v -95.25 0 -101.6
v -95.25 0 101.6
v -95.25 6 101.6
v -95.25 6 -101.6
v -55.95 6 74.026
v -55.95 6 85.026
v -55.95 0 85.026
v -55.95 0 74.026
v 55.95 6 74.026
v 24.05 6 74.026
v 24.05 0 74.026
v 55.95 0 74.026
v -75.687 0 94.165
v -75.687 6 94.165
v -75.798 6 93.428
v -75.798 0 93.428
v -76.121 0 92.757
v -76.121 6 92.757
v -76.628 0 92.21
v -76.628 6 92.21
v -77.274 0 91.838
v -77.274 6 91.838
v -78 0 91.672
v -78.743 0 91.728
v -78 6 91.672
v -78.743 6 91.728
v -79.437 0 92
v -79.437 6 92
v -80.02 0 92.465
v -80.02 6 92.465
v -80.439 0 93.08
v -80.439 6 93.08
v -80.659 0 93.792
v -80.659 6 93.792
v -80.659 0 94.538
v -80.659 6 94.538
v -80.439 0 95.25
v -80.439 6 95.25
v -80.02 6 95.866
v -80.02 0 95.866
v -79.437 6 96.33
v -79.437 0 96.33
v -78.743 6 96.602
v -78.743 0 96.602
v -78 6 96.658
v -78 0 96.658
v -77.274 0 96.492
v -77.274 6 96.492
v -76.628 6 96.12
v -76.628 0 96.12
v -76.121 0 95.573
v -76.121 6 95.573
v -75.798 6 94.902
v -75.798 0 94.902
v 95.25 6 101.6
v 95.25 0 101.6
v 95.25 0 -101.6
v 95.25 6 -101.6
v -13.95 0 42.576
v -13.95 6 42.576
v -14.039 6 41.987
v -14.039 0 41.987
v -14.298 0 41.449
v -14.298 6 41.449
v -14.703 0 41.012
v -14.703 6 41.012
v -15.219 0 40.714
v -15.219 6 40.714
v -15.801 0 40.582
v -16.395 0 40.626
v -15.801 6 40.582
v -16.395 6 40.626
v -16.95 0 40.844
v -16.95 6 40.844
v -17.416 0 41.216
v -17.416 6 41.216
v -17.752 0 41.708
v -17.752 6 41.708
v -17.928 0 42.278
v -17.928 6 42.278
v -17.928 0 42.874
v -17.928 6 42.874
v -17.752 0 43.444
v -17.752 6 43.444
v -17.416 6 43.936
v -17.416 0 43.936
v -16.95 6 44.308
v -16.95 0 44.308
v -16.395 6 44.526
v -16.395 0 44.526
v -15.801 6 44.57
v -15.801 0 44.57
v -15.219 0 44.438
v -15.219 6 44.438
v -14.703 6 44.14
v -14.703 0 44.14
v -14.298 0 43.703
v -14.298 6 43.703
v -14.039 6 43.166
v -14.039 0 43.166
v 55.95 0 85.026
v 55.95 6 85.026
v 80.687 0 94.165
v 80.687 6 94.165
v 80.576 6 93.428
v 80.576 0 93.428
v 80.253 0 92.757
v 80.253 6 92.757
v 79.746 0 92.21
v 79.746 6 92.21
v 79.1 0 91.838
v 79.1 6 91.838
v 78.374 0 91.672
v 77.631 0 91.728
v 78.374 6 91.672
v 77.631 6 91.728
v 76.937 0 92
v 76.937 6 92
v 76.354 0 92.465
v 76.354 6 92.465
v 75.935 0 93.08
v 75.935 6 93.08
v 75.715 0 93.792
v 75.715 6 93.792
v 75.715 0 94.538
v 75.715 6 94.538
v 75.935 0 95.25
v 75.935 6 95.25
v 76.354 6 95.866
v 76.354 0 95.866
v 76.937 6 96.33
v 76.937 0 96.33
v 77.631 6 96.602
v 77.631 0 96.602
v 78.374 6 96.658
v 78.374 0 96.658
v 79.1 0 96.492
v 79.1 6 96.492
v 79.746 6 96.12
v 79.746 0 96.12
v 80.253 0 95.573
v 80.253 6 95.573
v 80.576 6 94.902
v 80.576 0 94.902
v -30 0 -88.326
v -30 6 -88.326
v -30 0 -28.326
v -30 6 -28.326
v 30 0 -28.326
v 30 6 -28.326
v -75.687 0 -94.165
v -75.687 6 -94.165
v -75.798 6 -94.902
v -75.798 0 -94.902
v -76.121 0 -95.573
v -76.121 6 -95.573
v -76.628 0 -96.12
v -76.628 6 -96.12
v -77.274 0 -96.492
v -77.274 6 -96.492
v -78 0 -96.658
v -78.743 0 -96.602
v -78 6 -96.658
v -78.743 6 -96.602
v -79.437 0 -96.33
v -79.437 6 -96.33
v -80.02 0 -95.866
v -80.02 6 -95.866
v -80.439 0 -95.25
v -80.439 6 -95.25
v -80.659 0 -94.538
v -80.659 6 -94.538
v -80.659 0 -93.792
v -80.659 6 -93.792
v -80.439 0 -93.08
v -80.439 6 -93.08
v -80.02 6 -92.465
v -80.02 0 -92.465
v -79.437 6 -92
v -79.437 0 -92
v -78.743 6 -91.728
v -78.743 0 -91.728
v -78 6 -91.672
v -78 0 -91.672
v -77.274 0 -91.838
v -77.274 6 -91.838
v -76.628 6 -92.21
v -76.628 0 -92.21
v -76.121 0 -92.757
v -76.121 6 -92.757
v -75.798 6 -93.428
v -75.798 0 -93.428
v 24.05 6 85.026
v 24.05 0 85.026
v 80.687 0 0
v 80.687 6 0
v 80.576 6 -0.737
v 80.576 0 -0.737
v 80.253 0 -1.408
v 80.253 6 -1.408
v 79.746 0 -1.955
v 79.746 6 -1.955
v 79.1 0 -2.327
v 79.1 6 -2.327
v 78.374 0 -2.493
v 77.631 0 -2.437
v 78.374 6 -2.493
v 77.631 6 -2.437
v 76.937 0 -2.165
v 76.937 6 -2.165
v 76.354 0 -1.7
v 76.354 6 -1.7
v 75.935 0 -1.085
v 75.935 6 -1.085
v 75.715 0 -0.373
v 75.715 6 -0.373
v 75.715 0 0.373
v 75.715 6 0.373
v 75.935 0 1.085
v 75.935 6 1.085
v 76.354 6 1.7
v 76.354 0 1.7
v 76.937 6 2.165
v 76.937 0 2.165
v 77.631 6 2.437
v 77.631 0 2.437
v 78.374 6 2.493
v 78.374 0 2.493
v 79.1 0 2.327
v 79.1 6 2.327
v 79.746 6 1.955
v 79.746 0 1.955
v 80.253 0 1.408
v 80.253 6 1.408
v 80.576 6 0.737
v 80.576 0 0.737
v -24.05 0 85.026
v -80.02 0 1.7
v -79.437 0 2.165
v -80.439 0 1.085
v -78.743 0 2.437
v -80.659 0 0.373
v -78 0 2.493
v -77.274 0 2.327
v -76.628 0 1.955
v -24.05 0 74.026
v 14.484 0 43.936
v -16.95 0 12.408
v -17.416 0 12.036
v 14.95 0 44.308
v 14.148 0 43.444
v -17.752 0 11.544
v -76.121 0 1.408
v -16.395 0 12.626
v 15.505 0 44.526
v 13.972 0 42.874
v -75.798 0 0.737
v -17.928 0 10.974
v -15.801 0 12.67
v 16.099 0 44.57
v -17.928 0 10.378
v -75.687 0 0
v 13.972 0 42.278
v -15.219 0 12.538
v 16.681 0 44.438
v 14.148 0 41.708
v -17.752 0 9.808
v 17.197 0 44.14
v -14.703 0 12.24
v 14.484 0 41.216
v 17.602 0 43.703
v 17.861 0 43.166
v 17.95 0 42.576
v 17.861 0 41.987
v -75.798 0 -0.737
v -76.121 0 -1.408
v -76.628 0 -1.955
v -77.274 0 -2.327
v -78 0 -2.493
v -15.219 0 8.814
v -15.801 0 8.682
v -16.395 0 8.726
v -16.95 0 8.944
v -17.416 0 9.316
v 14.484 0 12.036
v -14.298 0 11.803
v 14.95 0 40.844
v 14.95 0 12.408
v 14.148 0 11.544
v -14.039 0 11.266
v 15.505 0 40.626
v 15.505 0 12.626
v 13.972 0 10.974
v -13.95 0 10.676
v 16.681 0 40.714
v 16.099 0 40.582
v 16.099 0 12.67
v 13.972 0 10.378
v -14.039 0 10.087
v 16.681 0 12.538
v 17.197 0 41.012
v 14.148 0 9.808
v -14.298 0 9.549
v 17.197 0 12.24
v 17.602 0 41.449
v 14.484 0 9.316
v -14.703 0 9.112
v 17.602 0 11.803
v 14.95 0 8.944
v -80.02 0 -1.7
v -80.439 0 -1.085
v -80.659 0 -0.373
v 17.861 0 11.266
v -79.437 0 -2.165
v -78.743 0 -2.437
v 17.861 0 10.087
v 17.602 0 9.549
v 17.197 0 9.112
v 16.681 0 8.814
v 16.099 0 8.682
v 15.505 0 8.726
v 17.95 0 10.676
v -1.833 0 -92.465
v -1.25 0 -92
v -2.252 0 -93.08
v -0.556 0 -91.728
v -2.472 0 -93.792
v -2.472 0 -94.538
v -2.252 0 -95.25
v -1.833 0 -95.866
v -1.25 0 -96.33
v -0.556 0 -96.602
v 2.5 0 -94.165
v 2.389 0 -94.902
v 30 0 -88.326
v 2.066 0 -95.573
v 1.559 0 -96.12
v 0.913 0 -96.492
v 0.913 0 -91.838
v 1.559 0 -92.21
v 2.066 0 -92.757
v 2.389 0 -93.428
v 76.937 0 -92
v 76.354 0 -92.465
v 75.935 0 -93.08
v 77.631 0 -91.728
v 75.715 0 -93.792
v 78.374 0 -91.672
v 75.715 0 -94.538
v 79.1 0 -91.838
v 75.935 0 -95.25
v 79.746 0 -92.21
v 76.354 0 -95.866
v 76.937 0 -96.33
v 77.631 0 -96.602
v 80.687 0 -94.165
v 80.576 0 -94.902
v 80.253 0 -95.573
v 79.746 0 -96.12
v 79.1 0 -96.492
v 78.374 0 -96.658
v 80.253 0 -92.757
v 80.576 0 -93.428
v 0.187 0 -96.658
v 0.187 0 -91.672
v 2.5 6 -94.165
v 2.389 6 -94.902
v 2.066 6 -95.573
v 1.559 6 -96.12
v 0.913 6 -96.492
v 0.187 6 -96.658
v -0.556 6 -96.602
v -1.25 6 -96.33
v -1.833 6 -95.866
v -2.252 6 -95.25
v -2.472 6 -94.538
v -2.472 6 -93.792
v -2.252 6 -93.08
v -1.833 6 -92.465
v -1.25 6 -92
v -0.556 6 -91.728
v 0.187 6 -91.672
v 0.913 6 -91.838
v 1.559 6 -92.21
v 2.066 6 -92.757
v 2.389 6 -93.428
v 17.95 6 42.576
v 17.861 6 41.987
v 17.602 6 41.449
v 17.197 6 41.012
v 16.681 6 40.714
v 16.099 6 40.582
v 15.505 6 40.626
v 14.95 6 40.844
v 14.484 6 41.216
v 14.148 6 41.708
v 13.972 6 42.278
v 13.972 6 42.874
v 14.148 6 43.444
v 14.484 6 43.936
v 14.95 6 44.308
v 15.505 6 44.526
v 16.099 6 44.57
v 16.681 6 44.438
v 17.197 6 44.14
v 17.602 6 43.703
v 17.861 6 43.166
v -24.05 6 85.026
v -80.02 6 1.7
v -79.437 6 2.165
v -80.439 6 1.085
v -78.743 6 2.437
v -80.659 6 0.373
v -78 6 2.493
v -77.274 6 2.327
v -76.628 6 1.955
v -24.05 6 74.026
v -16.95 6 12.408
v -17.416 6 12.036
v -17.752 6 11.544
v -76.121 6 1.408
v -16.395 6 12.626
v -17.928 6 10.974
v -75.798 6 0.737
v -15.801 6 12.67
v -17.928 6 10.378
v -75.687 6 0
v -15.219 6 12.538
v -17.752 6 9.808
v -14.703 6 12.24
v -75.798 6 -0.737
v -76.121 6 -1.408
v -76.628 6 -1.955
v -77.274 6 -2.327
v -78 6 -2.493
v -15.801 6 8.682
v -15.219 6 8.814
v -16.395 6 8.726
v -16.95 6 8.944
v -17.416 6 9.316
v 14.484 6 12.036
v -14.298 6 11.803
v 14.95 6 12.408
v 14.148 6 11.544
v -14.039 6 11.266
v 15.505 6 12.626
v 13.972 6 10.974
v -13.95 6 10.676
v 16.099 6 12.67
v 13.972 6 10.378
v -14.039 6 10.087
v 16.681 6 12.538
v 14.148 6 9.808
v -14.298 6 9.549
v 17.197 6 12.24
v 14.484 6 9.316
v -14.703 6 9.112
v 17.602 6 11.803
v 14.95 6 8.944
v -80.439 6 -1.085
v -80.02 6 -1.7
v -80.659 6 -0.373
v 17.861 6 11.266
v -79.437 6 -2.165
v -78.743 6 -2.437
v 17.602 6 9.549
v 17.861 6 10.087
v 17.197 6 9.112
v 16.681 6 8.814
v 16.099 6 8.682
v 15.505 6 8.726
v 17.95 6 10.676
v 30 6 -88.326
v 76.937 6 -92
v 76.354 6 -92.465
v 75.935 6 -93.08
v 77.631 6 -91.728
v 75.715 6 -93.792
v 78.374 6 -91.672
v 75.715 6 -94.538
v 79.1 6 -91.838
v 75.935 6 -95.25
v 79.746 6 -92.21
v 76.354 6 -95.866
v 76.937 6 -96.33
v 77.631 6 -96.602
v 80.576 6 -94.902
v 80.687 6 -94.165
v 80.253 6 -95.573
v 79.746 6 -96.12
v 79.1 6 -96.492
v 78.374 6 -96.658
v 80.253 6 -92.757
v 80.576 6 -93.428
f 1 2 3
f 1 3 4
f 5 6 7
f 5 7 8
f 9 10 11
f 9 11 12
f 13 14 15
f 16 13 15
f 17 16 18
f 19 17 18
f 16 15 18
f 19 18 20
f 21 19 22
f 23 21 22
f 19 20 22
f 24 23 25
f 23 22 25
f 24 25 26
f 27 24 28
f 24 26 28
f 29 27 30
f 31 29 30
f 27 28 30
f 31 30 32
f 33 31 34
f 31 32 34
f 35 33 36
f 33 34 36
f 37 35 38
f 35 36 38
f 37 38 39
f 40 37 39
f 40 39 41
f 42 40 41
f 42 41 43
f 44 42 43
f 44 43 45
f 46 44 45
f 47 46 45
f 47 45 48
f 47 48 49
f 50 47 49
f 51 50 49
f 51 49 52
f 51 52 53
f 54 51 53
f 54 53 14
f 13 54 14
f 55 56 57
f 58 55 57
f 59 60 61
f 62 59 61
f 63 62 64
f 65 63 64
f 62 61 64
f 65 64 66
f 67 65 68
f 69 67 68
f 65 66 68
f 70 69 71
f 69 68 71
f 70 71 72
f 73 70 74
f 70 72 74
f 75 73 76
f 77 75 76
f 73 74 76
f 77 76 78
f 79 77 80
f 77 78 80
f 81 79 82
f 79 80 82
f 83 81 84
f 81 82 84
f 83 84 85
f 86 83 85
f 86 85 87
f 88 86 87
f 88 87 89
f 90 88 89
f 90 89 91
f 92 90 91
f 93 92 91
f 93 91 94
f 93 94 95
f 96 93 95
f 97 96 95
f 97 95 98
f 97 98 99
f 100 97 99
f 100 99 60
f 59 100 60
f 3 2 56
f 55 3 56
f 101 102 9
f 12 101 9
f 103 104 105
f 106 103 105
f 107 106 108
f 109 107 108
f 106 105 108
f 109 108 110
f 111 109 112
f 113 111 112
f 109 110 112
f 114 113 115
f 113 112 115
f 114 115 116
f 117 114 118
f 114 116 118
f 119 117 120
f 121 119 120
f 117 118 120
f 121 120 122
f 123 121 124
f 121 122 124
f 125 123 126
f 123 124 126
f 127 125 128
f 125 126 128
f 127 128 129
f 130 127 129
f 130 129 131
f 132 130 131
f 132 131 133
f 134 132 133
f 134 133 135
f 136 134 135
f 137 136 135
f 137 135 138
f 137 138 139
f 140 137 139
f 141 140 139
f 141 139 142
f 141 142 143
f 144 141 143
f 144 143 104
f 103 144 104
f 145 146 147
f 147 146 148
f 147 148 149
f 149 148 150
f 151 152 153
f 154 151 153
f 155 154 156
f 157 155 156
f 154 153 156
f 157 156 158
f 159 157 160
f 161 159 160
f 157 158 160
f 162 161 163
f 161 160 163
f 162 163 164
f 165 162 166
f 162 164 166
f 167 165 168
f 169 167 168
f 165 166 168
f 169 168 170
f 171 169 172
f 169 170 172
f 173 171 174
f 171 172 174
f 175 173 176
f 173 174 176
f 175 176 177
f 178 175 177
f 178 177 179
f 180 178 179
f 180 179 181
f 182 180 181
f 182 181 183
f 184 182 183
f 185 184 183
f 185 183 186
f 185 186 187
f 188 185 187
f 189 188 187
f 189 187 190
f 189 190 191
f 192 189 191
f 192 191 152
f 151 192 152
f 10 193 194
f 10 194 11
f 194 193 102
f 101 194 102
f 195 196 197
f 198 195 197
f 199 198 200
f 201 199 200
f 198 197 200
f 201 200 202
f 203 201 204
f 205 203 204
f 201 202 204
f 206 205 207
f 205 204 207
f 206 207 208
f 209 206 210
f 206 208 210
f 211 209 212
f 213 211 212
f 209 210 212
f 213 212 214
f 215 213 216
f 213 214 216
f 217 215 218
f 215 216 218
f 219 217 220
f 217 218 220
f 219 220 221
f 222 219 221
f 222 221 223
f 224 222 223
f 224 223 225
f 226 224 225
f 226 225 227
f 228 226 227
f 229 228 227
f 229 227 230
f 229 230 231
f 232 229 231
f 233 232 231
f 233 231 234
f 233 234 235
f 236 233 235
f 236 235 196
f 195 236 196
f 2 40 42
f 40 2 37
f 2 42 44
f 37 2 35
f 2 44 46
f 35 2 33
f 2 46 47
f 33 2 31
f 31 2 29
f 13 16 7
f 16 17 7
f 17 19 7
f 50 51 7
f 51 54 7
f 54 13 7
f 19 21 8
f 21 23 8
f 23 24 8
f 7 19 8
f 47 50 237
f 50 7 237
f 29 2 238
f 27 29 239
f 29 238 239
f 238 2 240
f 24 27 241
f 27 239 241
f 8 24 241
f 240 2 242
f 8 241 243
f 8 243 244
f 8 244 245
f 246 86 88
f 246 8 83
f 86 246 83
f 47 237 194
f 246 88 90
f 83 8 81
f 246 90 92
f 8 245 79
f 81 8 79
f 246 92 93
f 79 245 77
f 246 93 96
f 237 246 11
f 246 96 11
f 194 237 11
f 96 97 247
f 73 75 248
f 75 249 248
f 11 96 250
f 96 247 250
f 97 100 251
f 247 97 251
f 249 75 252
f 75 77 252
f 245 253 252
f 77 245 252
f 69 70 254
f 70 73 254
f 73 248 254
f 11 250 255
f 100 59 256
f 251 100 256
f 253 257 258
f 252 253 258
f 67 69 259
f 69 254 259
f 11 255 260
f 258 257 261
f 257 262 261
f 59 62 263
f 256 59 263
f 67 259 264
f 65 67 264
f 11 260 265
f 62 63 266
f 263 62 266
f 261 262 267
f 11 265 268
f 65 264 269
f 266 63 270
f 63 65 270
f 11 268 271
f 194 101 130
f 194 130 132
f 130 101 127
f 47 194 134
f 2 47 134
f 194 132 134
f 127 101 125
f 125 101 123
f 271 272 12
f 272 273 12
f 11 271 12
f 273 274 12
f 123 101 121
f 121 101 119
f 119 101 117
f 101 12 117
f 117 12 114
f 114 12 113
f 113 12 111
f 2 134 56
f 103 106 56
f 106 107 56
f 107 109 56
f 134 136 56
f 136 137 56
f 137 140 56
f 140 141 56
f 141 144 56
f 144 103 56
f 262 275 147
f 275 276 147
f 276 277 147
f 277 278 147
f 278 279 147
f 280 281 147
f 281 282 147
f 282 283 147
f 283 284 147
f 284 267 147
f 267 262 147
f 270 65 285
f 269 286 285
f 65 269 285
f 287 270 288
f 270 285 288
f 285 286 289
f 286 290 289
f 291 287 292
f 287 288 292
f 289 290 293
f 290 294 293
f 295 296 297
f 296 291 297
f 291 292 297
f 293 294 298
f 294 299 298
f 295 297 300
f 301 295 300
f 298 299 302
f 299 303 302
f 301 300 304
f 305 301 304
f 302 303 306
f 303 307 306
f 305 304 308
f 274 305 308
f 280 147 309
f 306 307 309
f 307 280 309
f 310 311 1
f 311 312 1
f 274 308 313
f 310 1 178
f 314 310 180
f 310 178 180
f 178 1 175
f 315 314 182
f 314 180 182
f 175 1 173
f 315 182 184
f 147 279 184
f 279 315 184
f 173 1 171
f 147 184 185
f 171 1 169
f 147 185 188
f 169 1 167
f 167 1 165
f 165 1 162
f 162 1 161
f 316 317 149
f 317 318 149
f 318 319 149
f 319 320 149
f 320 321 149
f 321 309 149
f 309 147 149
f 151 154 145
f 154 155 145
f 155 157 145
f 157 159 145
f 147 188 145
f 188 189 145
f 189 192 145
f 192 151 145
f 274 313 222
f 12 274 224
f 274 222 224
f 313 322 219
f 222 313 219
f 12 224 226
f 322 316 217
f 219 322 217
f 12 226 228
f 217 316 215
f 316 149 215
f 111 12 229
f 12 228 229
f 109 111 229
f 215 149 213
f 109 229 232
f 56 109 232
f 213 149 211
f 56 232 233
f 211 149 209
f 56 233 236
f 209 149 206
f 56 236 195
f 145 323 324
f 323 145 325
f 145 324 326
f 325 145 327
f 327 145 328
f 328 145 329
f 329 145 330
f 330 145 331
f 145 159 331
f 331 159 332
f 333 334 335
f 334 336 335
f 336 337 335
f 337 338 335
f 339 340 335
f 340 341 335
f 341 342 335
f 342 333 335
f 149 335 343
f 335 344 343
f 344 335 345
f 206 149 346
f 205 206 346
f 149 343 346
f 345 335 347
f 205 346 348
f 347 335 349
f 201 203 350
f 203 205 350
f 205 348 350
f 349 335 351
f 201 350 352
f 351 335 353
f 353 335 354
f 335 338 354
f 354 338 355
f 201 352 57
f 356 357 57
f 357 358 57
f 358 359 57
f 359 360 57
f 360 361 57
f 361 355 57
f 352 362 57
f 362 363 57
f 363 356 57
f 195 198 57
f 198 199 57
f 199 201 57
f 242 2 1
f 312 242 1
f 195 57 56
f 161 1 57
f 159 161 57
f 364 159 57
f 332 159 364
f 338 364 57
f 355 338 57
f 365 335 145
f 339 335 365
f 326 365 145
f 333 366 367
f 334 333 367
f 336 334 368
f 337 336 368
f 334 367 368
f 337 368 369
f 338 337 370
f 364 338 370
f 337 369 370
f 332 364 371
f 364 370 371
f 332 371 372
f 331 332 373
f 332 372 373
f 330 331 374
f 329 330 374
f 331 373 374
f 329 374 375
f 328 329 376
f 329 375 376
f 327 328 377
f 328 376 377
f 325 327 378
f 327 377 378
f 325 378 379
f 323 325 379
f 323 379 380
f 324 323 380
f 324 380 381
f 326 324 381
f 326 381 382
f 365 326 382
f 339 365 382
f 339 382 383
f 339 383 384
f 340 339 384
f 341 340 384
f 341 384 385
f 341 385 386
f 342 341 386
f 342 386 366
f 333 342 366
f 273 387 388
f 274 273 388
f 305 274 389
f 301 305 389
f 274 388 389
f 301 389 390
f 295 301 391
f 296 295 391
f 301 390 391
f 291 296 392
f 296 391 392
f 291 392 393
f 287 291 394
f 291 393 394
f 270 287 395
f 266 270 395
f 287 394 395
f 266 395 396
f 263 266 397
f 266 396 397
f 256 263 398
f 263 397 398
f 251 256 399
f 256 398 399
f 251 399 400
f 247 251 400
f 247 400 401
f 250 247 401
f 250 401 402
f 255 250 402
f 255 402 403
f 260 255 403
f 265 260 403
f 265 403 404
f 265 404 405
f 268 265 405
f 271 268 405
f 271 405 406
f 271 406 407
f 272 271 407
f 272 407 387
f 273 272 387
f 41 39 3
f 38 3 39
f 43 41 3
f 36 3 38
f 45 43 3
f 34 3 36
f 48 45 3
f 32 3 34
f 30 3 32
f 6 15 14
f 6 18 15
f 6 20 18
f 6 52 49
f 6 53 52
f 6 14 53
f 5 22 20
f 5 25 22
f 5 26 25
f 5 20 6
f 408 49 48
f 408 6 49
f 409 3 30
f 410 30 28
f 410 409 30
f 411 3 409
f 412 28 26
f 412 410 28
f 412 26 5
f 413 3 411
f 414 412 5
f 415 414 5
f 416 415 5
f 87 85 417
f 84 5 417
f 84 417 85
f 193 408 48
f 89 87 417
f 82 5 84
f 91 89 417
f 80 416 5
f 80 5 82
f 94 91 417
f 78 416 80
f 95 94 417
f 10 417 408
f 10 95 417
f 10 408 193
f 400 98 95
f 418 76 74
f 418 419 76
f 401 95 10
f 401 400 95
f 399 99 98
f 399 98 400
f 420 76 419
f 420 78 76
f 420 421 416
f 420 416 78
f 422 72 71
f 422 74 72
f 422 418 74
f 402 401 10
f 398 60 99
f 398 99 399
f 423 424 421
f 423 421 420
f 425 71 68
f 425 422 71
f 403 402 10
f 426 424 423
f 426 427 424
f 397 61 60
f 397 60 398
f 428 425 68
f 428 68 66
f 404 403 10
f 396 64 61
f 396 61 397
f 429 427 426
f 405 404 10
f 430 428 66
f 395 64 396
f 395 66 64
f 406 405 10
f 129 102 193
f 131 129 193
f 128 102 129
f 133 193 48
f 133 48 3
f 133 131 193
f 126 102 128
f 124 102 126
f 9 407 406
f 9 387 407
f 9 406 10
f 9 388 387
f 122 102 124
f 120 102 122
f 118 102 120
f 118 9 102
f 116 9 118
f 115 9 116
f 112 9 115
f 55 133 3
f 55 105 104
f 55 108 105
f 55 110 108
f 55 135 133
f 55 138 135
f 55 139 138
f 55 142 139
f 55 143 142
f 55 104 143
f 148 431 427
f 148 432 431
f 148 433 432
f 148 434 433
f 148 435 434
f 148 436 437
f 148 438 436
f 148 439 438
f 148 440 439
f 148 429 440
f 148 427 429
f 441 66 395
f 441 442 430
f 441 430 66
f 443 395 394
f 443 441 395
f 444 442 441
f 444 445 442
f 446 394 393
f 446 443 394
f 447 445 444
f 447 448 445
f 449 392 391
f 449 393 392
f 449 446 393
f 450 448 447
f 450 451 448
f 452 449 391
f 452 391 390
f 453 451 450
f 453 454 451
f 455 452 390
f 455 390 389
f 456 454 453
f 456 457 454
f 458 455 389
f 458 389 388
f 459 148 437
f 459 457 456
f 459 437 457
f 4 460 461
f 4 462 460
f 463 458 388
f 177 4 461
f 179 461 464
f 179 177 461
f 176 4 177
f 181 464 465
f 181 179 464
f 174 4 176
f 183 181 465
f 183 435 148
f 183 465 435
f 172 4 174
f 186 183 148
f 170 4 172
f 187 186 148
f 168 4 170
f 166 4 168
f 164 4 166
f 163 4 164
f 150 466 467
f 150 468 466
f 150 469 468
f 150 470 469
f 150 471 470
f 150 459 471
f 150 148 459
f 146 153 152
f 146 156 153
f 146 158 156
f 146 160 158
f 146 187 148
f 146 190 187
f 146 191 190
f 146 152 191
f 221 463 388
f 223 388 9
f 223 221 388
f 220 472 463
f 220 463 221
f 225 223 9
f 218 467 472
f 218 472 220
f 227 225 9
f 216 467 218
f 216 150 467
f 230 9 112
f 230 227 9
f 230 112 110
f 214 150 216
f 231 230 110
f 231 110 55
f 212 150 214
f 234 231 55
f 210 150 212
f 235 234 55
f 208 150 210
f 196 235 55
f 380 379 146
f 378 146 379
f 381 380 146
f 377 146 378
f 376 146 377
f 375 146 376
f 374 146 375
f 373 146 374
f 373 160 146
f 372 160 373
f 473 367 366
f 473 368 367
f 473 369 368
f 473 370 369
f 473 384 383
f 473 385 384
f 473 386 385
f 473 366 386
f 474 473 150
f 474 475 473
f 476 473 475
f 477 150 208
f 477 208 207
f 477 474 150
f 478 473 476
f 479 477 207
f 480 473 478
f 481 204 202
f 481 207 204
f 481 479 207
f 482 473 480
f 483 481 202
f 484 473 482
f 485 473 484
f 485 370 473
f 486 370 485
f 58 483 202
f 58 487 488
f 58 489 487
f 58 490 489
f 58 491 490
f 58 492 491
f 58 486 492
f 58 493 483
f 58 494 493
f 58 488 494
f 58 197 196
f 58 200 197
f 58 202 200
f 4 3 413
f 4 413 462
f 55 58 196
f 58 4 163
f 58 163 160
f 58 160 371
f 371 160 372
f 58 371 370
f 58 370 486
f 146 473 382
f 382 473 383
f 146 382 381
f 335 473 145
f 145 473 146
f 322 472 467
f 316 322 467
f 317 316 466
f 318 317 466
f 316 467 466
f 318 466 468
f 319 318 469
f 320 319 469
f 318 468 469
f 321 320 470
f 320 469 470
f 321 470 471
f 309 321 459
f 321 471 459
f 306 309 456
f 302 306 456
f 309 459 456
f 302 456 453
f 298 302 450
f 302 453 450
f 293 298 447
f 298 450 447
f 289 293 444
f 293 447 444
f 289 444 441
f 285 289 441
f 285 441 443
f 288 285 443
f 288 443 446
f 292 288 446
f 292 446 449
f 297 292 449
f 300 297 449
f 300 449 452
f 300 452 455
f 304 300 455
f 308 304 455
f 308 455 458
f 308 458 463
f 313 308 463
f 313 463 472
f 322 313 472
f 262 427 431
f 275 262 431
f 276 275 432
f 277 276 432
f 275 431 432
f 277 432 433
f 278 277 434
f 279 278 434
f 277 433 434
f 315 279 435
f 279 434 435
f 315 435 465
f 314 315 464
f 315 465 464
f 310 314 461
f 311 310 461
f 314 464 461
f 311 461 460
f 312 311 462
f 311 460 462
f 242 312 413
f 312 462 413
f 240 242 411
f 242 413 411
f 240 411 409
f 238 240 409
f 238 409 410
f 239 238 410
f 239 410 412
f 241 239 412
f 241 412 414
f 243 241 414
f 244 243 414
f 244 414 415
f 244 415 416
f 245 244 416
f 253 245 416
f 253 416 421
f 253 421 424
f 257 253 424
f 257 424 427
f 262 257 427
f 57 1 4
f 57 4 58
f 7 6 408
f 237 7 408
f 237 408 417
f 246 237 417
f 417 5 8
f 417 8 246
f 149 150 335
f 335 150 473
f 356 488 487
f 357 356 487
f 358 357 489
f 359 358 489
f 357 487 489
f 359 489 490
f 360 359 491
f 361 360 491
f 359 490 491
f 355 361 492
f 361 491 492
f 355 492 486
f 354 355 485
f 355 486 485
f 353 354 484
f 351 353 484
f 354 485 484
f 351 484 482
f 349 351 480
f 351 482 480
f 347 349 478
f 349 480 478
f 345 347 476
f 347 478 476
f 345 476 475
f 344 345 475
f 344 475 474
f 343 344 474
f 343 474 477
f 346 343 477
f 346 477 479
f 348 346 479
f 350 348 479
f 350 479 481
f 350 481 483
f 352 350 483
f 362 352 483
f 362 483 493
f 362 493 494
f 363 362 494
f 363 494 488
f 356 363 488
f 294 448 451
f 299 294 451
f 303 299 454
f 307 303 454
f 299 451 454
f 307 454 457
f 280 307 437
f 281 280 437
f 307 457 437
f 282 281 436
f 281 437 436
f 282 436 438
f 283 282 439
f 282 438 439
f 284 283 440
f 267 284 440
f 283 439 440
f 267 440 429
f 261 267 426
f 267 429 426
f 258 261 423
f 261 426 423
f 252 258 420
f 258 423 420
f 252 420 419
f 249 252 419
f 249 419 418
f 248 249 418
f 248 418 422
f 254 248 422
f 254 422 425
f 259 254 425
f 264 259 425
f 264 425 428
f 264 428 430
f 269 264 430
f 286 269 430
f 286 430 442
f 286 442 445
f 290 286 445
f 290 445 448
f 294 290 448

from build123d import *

# Parameters (mm, degrees)
SKETCH2_W           = 190.5
SKETCH2_H           = 203.2
BOSS_EXTRUDE1_DEPTH = 6
SKETCH5_R           = 2.5
CUT_EXTRUDE6_DEPTH  = 7
SKETCH6_W           = 31.9
SKETCH6_H           = 11
SKETCH6_R           = 2
CUT_EXTRUDE8_DEPTH  = 10


with BuildPart() as part:
    # Sketch2 → Boss-Extrude1 (new body)
    with BuildSketch(Plane(origin=(0, 0, 0), x_dir=(1, 0, 0), z_dir=(0, 1, 0))):
        Rectangle(SKETCH2_W, SKETCH2_H)
    extrude(amount=BOSS_EXTRUDE1_DEPTH)

    # Sketch5 → Cut-Extrude6 (cut, through all)
    with BuildSketch(Plane(origin=(0, 6, 0), x_dir=(1, 0, 0), z_dir=(0, 1, 0))):
        with Locations((-78.187036158, 94.165073798)):
            Circle(SKETCH5_R)
        with Locations((0, 94.165073798)):
            Circle(SKETCH5_R)
        with Locations((78.187036158, 0)):
            Circle(SKETCH5_R)
        with Locations((-78.187036158, 0)):
            Circle(SKETCH5_R)
        with Locations((78.187036158, 94.165073798)):
            Circle(SKETCH5_R)
        with Locations((-78.187036158, -94.165073798)):
            Circle(SKETCH5_R)
        with Locations((78.187036158, -94.165073798)):
            Circle(SKETCH5_R)
    extrude(amount=-CUT_EXTRUDE6_DEPTH, mode=Mode.SUBTRACT)

    # Sketch6 → Cut-Extrude8 (cut)
    with BuildSketch(Plane(origin=(0, 6, 0), x_dir=(1, 0, 0), z_dir=(0, 1, 0))):
        with Locations((-40, -79.526039011)):
            Rectangle(SKETCH6_W, SKETCH6_H)
        Polygon((-30, 28.326034404), (-15.95, 28.326034404), (20, 28.326034404), (30, 28.326034404), (30, 88.326034404), (-30, 88.326034404), align=None)
        with Locations((40, -79.526039011)):
            Rectangle(SKETCH6_W, SKETCH6_H)
        with Locations((15.95, -10.676039011)):
            Circle(SKETCH6_R)
        with Locations((-15.95, -10.676039011)):
            Circle(SKETCH6_R)
        with Locations((-15.95, -42.576039011)):
            Circle(SKETCH6_R)
        with Locations((15.95, -42.576039011)):
            Circle(SKETCH6_R)
    extrude(amount=-CUT_EXTRUDE8_DEPTH, mode=Mode.SUBTRACT)


solid = part.part
